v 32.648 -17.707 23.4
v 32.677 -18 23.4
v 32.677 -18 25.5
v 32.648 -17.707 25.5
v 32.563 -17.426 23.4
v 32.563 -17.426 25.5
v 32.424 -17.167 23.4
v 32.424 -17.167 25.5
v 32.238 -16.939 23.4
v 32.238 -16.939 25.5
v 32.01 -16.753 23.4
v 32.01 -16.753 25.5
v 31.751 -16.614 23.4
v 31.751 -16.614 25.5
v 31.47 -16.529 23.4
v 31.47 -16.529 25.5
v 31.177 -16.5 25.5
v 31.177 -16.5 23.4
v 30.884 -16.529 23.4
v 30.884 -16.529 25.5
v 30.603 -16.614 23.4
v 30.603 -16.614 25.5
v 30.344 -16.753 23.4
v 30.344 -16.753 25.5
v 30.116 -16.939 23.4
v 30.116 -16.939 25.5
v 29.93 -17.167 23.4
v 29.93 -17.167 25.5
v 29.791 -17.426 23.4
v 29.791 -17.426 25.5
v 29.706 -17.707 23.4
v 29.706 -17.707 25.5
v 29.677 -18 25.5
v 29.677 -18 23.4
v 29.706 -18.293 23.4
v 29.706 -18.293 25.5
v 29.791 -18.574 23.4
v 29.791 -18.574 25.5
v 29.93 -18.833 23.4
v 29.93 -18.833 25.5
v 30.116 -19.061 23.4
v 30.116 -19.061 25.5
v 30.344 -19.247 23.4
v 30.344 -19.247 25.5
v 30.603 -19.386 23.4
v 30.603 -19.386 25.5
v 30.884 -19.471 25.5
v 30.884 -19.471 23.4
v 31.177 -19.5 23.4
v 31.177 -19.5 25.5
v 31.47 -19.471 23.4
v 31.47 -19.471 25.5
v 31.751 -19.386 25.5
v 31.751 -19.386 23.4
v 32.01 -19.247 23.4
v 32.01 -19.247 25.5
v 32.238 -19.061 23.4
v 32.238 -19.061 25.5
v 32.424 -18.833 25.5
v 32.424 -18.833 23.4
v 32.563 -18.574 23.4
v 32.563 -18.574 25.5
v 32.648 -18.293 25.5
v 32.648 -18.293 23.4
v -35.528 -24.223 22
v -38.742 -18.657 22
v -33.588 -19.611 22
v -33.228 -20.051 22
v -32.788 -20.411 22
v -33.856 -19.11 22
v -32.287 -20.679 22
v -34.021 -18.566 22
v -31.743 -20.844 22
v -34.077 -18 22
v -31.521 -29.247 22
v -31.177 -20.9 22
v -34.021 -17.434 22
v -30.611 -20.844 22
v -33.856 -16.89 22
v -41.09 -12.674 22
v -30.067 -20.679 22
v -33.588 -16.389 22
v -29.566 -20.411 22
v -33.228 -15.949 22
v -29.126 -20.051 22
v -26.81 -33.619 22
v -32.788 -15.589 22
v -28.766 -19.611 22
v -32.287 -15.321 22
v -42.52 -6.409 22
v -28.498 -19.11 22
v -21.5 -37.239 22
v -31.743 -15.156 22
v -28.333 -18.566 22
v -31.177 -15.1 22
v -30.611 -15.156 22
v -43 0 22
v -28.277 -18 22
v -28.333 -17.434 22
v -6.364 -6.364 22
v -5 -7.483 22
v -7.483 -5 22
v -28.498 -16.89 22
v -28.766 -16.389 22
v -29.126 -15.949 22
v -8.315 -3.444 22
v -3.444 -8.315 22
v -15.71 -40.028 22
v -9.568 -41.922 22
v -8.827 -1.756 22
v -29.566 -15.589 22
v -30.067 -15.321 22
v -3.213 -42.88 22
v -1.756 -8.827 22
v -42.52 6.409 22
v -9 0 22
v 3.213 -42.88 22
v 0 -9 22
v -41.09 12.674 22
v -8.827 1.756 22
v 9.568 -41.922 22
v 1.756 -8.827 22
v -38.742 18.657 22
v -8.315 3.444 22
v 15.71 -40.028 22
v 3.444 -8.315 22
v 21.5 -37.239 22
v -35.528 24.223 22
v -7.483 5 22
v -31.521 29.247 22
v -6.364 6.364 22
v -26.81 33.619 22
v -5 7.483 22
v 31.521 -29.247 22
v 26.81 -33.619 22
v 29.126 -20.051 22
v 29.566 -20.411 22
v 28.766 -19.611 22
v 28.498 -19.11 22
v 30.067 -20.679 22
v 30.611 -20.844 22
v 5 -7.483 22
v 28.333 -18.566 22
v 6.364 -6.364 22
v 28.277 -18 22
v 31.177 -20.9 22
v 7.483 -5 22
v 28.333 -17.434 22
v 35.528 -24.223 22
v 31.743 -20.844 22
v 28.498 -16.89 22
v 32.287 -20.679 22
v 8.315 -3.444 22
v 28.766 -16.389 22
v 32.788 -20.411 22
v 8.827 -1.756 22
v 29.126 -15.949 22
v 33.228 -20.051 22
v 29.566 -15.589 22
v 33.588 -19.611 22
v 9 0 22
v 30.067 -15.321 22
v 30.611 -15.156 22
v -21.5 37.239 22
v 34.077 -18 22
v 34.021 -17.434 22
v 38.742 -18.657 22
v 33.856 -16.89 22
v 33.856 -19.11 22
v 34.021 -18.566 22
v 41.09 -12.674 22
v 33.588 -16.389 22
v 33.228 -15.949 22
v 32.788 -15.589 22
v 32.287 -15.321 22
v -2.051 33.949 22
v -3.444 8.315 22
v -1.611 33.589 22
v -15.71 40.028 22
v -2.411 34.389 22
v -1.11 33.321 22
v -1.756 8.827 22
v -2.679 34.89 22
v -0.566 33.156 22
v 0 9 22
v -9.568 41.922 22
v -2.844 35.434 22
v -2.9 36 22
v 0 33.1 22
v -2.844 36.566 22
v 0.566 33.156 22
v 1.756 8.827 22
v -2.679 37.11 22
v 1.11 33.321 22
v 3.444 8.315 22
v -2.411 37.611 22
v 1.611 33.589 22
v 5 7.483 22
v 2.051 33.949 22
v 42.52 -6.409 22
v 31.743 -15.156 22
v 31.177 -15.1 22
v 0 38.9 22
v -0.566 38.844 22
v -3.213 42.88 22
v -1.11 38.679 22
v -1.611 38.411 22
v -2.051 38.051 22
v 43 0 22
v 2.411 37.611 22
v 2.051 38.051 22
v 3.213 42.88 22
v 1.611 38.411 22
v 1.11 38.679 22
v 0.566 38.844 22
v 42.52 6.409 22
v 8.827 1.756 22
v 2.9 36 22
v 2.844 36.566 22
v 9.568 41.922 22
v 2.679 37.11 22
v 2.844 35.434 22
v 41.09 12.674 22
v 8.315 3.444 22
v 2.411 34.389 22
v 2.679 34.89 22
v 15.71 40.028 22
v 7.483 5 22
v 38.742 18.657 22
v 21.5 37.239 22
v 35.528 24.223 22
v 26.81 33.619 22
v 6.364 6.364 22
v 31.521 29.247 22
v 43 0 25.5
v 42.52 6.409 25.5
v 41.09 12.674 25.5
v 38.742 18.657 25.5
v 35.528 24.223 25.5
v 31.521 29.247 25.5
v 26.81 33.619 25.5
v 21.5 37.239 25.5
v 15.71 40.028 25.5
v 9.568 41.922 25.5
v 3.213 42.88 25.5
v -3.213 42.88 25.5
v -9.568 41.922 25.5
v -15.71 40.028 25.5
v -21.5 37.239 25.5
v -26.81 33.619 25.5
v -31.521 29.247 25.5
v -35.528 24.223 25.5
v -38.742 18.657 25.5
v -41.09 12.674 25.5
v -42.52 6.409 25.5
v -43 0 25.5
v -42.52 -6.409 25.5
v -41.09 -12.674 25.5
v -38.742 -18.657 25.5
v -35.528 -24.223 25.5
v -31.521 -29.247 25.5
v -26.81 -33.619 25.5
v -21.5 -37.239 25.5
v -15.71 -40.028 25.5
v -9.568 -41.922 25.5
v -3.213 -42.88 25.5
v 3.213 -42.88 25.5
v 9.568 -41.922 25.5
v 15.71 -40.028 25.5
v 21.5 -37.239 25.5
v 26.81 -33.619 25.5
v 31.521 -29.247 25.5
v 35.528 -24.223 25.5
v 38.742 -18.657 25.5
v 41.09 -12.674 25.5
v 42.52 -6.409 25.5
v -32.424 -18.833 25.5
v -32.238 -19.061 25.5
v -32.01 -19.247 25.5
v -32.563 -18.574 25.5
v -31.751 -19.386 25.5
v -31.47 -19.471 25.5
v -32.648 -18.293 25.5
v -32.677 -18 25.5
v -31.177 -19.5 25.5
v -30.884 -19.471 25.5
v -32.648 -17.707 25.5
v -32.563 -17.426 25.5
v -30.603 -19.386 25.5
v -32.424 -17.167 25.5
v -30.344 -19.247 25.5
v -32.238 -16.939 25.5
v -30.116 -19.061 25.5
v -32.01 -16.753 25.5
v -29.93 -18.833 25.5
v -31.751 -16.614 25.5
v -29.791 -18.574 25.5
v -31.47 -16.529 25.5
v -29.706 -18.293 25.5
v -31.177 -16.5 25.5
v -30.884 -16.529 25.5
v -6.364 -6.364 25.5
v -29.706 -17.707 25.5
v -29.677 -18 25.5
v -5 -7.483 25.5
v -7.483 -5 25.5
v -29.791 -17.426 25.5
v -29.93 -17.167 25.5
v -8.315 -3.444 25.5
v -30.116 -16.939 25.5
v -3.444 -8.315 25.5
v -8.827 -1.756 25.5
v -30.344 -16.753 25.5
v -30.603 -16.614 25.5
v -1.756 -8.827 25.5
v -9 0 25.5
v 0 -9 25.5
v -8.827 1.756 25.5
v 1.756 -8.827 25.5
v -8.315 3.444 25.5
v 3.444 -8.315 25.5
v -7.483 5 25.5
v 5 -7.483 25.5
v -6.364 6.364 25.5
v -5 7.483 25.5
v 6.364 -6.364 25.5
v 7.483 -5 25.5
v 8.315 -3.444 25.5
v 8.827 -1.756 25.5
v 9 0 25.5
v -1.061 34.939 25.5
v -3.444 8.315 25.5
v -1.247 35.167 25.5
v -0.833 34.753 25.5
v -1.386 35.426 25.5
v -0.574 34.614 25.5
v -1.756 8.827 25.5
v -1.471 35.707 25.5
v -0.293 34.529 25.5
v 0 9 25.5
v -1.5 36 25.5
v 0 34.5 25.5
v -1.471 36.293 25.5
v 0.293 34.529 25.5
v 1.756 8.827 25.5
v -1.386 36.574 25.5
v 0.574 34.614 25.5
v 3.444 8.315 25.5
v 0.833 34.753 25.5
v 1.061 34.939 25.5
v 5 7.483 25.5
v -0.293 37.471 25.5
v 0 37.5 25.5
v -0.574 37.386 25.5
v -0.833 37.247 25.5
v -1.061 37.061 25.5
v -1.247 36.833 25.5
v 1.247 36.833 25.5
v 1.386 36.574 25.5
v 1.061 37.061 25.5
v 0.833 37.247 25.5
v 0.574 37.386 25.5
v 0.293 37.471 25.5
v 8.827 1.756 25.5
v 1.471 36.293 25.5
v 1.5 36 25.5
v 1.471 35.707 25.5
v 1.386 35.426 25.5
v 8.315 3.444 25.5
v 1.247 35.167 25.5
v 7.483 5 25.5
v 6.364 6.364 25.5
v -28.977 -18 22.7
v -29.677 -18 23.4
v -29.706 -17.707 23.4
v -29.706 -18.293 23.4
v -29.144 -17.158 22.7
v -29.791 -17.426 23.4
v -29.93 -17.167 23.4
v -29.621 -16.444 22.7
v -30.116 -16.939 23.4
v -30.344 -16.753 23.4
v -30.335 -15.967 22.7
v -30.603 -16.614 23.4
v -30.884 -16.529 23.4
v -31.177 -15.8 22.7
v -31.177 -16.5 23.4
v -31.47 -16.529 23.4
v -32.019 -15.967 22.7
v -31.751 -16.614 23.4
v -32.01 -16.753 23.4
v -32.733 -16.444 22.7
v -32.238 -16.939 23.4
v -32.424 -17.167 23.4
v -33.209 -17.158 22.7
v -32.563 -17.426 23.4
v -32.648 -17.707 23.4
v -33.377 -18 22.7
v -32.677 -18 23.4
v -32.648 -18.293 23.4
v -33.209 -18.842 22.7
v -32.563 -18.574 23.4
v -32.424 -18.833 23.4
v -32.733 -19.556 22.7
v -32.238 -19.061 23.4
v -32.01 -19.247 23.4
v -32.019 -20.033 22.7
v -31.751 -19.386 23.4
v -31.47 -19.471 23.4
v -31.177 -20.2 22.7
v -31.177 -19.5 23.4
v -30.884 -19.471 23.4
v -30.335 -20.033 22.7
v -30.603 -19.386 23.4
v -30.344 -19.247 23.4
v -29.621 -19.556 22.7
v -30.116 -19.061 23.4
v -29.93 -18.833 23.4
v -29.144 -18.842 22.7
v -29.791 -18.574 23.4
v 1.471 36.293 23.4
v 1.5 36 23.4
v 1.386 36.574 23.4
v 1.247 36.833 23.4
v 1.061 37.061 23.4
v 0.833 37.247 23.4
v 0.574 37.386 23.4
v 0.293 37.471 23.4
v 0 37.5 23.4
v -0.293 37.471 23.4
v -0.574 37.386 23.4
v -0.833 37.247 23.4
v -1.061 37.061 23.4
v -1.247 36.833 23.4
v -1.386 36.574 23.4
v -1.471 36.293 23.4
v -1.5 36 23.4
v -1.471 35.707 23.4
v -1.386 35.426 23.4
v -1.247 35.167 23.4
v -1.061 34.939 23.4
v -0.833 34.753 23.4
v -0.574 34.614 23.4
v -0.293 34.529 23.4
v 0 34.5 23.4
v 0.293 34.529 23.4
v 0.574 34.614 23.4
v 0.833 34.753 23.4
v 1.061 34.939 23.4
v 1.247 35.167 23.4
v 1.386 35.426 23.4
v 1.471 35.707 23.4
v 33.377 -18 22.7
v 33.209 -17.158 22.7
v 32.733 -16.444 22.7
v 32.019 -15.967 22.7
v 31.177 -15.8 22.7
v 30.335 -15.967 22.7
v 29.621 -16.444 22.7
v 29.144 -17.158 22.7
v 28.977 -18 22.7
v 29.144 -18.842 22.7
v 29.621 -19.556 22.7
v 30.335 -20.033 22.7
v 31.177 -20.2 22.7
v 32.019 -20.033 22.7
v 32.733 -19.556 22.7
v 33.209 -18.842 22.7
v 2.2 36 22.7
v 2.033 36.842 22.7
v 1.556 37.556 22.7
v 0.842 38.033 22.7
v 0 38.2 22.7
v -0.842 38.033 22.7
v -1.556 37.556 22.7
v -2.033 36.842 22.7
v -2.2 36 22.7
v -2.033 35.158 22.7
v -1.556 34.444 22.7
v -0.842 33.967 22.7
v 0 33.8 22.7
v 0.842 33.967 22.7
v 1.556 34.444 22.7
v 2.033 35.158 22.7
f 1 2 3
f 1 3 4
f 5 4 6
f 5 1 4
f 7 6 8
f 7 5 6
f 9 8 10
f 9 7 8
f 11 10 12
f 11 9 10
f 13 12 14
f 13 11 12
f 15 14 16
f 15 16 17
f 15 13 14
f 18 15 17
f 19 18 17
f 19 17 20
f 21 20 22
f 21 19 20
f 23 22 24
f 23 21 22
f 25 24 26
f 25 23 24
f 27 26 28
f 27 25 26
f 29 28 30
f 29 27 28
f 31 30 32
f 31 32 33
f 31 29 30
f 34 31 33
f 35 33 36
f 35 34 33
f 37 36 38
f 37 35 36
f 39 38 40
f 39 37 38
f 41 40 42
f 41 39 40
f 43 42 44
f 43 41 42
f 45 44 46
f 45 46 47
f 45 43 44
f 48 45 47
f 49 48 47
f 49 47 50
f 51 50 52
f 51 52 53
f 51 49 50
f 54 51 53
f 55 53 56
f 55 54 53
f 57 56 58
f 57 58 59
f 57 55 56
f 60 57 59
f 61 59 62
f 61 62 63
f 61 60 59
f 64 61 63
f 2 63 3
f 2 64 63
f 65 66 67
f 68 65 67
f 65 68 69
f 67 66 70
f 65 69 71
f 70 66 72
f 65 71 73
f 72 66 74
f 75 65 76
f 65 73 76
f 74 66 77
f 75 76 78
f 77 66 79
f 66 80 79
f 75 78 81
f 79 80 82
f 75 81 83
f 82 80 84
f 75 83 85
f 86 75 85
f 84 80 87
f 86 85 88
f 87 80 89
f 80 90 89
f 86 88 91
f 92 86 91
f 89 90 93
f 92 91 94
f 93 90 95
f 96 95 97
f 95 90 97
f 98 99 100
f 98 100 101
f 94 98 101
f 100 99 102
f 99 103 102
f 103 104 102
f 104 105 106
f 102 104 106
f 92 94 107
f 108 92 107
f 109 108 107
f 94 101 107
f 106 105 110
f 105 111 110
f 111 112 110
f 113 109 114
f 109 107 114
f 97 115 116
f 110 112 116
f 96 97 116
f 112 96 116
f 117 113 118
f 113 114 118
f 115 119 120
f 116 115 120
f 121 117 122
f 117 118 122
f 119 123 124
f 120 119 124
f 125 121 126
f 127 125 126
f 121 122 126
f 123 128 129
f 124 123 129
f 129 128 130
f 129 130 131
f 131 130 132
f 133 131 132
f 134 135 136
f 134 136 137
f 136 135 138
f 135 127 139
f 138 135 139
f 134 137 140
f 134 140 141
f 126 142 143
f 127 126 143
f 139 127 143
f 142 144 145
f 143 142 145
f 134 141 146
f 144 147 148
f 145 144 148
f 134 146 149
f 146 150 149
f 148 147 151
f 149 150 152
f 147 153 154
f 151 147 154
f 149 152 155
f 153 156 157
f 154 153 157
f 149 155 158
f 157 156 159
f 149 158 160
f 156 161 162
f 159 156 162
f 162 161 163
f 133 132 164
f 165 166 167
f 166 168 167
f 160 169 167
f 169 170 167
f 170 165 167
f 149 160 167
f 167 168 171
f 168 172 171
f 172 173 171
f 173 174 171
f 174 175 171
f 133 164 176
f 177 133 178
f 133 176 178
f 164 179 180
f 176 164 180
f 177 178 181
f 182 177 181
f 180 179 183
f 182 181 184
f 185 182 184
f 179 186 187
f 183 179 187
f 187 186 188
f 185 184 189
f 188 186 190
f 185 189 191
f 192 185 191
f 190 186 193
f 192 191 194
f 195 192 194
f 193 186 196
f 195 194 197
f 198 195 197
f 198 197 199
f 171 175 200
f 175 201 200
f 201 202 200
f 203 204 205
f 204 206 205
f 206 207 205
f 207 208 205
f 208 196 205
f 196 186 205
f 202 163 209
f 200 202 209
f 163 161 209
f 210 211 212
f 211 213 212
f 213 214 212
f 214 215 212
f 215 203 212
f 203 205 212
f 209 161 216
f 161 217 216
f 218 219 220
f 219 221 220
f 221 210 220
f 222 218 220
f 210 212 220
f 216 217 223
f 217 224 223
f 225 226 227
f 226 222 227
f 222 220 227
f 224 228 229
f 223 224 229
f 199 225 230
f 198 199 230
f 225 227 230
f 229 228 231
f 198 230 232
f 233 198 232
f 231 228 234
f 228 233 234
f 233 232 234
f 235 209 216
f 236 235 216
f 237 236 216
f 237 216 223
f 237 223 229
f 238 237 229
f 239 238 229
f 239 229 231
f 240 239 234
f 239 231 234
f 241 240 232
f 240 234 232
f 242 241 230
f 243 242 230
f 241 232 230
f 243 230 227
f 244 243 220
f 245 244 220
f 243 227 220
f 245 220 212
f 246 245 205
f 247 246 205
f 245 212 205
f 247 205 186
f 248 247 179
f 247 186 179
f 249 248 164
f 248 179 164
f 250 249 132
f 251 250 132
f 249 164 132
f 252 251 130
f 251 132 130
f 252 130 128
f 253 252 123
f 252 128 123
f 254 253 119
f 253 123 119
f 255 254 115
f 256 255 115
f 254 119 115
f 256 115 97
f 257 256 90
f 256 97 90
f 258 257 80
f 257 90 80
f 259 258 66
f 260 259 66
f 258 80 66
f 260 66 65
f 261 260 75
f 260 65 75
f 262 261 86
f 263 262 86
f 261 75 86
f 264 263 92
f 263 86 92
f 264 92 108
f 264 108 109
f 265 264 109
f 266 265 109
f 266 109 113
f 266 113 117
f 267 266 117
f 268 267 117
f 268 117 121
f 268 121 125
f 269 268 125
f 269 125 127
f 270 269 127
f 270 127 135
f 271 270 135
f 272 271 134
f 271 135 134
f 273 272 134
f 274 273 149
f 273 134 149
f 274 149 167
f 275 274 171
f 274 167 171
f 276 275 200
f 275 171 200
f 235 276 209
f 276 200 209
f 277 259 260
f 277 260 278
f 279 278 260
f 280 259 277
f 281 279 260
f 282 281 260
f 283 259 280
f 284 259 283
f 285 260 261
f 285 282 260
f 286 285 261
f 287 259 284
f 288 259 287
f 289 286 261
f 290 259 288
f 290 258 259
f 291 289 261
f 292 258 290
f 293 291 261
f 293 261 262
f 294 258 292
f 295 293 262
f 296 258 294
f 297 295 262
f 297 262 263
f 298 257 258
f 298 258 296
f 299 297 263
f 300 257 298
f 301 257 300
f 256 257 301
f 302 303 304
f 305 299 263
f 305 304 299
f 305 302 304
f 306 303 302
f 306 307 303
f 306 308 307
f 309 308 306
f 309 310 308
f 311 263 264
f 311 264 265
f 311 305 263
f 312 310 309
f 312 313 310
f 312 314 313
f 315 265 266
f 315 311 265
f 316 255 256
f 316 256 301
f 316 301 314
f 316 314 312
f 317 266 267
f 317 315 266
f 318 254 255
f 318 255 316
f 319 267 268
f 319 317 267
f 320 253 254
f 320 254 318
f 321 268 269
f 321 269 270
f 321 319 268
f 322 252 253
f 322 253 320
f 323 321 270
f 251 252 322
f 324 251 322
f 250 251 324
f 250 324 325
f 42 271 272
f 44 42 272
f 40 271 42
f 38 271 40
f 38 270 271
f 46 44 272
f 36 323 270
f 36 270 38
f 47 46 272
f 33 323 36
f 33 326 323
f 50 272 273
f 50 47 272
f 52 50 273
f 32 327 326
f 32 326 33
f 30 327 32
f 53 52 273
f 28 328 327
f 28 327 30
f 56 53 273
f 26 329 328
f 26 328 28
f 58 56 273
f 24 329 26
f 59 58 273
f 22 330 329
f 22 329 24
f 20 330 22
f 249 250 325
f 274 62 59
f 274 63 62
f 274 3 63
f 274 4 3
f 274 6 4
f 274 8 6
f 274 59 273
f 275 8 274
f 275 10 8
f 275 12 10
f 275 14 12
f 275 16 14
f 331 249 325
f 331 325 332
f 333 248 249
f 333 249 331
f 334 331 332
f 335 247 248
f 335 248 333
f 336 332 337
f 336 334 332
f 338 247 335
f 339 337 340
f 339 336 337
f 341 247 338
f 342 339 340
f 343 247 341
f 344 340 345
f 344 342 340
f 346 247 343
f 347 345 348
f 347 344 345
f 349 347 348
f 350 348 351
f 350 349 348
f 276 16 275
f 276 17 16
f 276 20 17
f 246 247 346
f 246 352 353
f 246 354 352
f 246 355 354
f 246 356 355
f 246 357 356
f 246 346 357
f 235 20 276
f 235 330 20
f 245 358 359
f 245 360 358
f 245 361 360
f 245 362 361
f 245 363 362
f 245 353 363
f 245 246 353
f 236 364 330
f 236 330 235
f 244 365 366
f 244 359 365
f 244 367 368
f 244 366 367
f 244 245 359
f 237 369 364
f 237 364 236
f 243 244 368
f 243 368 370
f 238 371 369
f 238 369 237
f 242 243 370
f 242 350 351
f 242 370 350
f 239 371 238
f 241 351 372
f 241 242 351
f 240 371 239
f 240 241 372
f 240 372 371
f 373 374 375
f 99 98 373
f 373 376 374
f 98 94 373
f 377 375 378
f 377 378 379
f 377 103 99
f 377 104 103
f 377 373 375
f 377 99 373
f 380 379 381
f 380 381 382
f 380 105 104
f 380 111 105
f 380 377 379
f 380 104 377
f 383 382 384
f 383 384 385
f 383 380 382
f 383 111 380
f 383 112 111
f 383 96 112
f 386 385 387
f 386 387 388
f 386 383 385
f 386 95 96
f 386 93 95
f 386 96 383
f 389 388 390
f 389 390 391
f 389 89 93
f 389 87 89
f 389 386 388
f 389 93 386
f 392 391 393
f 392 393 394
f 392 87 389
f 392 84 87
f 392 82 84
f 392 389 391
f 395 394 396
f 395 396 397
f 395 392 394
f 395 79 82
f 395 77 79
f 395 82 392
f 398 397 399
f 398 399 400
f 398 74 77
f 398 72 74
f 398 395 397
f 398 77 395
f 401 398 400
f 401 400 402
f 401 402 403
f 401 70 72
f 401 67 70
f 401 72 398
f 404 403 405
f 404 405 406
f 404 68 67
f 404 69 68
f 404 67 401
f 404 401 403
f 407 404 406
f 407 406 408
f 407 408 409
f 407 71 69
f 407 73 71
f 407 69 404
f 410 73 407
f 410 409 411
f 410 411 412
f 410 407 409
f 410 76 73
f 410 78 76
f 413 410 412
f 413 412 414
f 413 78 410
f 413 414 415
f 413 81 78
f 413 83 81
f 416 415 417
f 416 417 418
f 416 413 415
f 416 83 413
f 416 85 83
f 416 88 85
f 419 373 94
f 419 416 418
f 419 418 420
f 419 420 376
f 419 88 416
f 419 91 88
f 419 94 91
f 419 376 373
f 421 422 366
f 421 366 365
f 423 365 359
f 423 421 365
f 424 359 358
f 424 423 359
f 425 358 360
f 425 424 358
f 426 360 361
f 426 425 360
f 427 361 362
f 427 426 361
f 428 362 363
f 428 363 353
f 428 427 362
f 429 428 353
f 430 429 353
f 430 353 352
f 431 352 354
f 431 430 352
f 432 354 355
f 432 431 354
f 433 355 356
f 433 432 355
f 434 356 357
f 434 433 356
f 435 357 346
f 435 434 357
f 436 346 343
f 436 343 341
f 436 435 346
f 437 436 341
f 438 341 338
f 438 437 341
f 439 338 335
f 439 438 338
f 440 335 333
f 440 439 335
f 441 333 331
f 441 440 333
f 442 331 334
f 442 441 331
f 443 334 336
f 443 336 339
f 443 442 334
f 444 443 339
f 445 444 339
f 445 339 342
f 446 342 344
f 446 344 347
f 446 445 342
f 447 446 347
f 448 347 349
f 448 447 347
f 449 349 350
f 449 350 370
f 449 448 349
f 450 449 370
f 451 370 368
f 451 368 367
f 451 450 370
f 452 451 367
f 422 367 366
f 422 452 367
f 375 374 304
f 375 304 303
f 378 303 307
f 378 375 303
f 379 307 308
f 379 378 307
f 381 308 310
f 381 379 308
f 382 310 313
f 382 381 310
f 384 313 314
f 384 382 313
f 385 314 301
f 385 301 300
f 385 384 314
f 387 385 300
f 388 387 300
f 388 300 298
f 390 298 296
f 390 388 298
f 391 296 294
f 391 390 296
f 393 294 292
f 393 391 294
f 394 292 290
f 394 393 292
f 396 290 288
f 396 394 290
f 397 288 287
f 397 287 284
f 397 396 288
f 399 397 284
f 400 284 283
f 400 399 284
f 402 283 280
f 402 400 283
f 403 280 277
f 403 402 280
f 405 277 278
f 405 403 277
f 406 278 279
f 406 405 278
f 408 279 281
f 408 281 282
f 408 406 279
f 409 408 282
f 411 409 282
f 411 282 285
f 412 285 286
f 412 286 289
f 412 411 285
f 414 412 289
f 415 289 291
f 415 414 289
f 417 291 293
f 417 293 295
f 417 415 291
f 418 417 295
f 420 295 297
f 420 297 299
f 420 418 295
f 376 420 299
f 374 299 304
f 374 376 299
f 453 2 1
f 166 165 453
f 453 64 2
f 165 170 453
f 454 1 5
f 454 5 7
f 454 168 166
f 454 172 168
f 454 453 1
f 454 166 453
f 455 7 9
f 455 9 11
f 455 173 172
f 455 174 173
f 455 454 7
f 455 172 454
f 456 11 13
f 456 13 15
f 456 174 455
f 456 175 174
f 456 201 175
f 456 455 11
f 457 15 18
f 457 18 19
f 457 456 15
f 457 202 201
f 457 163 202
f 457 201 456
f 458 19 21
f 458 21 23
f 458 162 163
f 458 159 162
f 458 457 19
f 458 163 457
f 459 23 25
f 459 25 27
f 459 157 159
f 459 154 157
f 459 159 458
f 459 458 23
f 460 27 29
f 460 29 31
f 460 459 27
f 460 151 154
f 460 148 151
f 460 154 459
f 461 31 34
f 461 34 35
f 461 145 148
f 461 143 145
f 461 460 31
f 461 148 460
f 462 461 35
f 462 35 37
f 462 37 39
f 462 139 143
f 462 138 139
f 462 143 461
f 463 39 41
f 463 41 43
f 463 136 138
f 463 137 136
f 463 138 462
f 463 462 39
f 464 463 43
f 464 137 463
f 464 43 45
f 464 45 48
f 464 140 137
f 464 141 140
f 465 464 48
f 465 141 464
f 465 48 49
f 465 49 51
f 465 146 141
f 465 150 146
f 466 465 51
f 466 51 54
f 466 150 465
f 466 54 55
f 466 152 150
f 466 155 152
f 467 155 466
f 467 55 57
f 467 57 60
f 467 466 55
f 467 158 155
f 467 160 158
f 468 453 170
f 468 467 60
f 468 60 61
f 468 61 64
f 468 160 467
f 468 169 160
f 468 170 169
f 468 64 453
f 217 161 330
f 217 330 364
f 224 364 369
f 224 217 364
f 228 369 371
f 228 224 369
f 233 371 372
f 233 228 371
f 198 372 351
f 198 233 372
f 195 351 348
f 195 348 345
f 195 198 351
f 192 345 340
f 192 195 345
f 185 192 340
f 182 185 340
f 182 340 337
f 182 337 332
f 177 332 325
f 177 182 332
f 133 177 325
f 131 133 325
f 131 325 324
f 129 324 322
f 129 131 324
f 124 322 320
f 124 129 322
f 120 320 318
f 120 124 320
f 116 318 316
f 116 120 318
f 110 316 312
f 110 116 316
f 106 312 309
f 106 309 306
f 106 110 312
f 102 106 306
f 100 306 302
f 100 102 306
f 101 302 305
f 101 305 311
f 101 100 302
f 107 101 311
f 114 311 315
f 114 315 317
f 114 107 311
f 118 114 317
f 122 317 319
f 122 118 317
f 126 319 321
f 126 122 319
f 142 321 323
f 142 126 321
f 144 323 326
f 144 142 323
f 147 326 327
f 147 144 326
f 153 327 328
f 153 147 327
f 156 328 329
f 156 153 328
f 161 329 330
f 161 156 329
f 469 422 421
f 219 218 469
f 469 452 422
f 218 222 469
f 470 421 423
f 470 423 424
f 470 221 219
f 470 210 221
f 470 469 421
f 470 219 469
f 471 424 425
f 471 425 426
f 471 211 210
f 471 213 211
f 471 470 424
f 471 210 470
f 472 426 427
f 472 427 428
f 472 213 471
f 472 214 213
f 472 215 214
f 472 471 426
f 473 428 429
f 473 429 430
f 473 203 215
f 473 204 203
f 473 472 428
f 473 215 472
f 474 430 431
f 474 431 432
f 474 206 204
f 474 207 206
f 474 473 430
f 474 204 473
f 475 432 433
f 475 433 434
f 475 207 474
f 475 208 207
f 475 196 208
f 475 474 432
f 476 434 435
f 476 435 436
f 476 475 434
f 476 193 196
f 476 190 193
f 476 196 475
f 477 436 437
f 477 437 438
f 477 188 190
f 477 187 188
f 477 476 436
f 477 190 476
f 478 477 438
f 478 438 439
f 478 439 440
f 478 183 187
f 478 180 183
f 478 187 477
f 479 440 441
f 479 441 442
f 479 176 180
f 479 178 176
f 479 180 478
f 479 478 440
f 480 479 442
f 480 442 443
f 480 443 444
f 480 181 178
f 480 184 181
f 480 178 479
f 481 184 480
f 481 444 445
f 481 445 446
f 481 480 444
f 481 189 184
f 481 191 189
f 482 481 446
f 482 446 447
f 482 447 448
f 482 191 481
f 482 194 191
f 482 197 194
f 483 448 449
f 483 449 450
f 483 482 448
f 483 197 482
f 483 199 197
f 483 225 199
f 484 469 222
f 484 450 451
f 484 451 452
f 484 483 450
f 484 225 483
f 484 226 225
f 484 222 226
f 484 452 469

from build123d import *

# Parameters (mm, degrees)
SKETCH006_R   = 43
SKETCH006_R_2 = 1.5
SKETCH006_R_3 = 9
PAD_DEPTH     = 3.5
CHAMFER_SIZE  = 1.4


with BuildPart() as part:
    # Sketch006 → Pad (new body)
    with BuildSketch(Plane.XY.offset(22)):
        Circle(SKETCH006_R)
        with Locations((0, 36)):
            Circle(SKETCH006_R_2, mode=Mode.SUBTRACT)
        with Locations((31.176915, -18)):
            Circle(SKETCH006_R_2, mode=Mode.SUBTRACT)
        with Locations((-31.176915, -18)):
            Circle(SKETCH006_R_2, mode=Mode.SUBTRACT)
        Circle(SKETCH006_R_3, mode=Mode.SUBTRACT)
    extrude(amount=PAD_DEPTH)

    # Chamfer
    chamfer_edges = [part.edges().sort_by_distance(p)[0] for p in [
        (-32.676915, -18, 22),
        (-1.5, 36, 22),
        (29.676915, -18, 22),
    ]]
    chamfer(chamfer_edges, length=CHAMFER_SIZE)


solid = part.part
